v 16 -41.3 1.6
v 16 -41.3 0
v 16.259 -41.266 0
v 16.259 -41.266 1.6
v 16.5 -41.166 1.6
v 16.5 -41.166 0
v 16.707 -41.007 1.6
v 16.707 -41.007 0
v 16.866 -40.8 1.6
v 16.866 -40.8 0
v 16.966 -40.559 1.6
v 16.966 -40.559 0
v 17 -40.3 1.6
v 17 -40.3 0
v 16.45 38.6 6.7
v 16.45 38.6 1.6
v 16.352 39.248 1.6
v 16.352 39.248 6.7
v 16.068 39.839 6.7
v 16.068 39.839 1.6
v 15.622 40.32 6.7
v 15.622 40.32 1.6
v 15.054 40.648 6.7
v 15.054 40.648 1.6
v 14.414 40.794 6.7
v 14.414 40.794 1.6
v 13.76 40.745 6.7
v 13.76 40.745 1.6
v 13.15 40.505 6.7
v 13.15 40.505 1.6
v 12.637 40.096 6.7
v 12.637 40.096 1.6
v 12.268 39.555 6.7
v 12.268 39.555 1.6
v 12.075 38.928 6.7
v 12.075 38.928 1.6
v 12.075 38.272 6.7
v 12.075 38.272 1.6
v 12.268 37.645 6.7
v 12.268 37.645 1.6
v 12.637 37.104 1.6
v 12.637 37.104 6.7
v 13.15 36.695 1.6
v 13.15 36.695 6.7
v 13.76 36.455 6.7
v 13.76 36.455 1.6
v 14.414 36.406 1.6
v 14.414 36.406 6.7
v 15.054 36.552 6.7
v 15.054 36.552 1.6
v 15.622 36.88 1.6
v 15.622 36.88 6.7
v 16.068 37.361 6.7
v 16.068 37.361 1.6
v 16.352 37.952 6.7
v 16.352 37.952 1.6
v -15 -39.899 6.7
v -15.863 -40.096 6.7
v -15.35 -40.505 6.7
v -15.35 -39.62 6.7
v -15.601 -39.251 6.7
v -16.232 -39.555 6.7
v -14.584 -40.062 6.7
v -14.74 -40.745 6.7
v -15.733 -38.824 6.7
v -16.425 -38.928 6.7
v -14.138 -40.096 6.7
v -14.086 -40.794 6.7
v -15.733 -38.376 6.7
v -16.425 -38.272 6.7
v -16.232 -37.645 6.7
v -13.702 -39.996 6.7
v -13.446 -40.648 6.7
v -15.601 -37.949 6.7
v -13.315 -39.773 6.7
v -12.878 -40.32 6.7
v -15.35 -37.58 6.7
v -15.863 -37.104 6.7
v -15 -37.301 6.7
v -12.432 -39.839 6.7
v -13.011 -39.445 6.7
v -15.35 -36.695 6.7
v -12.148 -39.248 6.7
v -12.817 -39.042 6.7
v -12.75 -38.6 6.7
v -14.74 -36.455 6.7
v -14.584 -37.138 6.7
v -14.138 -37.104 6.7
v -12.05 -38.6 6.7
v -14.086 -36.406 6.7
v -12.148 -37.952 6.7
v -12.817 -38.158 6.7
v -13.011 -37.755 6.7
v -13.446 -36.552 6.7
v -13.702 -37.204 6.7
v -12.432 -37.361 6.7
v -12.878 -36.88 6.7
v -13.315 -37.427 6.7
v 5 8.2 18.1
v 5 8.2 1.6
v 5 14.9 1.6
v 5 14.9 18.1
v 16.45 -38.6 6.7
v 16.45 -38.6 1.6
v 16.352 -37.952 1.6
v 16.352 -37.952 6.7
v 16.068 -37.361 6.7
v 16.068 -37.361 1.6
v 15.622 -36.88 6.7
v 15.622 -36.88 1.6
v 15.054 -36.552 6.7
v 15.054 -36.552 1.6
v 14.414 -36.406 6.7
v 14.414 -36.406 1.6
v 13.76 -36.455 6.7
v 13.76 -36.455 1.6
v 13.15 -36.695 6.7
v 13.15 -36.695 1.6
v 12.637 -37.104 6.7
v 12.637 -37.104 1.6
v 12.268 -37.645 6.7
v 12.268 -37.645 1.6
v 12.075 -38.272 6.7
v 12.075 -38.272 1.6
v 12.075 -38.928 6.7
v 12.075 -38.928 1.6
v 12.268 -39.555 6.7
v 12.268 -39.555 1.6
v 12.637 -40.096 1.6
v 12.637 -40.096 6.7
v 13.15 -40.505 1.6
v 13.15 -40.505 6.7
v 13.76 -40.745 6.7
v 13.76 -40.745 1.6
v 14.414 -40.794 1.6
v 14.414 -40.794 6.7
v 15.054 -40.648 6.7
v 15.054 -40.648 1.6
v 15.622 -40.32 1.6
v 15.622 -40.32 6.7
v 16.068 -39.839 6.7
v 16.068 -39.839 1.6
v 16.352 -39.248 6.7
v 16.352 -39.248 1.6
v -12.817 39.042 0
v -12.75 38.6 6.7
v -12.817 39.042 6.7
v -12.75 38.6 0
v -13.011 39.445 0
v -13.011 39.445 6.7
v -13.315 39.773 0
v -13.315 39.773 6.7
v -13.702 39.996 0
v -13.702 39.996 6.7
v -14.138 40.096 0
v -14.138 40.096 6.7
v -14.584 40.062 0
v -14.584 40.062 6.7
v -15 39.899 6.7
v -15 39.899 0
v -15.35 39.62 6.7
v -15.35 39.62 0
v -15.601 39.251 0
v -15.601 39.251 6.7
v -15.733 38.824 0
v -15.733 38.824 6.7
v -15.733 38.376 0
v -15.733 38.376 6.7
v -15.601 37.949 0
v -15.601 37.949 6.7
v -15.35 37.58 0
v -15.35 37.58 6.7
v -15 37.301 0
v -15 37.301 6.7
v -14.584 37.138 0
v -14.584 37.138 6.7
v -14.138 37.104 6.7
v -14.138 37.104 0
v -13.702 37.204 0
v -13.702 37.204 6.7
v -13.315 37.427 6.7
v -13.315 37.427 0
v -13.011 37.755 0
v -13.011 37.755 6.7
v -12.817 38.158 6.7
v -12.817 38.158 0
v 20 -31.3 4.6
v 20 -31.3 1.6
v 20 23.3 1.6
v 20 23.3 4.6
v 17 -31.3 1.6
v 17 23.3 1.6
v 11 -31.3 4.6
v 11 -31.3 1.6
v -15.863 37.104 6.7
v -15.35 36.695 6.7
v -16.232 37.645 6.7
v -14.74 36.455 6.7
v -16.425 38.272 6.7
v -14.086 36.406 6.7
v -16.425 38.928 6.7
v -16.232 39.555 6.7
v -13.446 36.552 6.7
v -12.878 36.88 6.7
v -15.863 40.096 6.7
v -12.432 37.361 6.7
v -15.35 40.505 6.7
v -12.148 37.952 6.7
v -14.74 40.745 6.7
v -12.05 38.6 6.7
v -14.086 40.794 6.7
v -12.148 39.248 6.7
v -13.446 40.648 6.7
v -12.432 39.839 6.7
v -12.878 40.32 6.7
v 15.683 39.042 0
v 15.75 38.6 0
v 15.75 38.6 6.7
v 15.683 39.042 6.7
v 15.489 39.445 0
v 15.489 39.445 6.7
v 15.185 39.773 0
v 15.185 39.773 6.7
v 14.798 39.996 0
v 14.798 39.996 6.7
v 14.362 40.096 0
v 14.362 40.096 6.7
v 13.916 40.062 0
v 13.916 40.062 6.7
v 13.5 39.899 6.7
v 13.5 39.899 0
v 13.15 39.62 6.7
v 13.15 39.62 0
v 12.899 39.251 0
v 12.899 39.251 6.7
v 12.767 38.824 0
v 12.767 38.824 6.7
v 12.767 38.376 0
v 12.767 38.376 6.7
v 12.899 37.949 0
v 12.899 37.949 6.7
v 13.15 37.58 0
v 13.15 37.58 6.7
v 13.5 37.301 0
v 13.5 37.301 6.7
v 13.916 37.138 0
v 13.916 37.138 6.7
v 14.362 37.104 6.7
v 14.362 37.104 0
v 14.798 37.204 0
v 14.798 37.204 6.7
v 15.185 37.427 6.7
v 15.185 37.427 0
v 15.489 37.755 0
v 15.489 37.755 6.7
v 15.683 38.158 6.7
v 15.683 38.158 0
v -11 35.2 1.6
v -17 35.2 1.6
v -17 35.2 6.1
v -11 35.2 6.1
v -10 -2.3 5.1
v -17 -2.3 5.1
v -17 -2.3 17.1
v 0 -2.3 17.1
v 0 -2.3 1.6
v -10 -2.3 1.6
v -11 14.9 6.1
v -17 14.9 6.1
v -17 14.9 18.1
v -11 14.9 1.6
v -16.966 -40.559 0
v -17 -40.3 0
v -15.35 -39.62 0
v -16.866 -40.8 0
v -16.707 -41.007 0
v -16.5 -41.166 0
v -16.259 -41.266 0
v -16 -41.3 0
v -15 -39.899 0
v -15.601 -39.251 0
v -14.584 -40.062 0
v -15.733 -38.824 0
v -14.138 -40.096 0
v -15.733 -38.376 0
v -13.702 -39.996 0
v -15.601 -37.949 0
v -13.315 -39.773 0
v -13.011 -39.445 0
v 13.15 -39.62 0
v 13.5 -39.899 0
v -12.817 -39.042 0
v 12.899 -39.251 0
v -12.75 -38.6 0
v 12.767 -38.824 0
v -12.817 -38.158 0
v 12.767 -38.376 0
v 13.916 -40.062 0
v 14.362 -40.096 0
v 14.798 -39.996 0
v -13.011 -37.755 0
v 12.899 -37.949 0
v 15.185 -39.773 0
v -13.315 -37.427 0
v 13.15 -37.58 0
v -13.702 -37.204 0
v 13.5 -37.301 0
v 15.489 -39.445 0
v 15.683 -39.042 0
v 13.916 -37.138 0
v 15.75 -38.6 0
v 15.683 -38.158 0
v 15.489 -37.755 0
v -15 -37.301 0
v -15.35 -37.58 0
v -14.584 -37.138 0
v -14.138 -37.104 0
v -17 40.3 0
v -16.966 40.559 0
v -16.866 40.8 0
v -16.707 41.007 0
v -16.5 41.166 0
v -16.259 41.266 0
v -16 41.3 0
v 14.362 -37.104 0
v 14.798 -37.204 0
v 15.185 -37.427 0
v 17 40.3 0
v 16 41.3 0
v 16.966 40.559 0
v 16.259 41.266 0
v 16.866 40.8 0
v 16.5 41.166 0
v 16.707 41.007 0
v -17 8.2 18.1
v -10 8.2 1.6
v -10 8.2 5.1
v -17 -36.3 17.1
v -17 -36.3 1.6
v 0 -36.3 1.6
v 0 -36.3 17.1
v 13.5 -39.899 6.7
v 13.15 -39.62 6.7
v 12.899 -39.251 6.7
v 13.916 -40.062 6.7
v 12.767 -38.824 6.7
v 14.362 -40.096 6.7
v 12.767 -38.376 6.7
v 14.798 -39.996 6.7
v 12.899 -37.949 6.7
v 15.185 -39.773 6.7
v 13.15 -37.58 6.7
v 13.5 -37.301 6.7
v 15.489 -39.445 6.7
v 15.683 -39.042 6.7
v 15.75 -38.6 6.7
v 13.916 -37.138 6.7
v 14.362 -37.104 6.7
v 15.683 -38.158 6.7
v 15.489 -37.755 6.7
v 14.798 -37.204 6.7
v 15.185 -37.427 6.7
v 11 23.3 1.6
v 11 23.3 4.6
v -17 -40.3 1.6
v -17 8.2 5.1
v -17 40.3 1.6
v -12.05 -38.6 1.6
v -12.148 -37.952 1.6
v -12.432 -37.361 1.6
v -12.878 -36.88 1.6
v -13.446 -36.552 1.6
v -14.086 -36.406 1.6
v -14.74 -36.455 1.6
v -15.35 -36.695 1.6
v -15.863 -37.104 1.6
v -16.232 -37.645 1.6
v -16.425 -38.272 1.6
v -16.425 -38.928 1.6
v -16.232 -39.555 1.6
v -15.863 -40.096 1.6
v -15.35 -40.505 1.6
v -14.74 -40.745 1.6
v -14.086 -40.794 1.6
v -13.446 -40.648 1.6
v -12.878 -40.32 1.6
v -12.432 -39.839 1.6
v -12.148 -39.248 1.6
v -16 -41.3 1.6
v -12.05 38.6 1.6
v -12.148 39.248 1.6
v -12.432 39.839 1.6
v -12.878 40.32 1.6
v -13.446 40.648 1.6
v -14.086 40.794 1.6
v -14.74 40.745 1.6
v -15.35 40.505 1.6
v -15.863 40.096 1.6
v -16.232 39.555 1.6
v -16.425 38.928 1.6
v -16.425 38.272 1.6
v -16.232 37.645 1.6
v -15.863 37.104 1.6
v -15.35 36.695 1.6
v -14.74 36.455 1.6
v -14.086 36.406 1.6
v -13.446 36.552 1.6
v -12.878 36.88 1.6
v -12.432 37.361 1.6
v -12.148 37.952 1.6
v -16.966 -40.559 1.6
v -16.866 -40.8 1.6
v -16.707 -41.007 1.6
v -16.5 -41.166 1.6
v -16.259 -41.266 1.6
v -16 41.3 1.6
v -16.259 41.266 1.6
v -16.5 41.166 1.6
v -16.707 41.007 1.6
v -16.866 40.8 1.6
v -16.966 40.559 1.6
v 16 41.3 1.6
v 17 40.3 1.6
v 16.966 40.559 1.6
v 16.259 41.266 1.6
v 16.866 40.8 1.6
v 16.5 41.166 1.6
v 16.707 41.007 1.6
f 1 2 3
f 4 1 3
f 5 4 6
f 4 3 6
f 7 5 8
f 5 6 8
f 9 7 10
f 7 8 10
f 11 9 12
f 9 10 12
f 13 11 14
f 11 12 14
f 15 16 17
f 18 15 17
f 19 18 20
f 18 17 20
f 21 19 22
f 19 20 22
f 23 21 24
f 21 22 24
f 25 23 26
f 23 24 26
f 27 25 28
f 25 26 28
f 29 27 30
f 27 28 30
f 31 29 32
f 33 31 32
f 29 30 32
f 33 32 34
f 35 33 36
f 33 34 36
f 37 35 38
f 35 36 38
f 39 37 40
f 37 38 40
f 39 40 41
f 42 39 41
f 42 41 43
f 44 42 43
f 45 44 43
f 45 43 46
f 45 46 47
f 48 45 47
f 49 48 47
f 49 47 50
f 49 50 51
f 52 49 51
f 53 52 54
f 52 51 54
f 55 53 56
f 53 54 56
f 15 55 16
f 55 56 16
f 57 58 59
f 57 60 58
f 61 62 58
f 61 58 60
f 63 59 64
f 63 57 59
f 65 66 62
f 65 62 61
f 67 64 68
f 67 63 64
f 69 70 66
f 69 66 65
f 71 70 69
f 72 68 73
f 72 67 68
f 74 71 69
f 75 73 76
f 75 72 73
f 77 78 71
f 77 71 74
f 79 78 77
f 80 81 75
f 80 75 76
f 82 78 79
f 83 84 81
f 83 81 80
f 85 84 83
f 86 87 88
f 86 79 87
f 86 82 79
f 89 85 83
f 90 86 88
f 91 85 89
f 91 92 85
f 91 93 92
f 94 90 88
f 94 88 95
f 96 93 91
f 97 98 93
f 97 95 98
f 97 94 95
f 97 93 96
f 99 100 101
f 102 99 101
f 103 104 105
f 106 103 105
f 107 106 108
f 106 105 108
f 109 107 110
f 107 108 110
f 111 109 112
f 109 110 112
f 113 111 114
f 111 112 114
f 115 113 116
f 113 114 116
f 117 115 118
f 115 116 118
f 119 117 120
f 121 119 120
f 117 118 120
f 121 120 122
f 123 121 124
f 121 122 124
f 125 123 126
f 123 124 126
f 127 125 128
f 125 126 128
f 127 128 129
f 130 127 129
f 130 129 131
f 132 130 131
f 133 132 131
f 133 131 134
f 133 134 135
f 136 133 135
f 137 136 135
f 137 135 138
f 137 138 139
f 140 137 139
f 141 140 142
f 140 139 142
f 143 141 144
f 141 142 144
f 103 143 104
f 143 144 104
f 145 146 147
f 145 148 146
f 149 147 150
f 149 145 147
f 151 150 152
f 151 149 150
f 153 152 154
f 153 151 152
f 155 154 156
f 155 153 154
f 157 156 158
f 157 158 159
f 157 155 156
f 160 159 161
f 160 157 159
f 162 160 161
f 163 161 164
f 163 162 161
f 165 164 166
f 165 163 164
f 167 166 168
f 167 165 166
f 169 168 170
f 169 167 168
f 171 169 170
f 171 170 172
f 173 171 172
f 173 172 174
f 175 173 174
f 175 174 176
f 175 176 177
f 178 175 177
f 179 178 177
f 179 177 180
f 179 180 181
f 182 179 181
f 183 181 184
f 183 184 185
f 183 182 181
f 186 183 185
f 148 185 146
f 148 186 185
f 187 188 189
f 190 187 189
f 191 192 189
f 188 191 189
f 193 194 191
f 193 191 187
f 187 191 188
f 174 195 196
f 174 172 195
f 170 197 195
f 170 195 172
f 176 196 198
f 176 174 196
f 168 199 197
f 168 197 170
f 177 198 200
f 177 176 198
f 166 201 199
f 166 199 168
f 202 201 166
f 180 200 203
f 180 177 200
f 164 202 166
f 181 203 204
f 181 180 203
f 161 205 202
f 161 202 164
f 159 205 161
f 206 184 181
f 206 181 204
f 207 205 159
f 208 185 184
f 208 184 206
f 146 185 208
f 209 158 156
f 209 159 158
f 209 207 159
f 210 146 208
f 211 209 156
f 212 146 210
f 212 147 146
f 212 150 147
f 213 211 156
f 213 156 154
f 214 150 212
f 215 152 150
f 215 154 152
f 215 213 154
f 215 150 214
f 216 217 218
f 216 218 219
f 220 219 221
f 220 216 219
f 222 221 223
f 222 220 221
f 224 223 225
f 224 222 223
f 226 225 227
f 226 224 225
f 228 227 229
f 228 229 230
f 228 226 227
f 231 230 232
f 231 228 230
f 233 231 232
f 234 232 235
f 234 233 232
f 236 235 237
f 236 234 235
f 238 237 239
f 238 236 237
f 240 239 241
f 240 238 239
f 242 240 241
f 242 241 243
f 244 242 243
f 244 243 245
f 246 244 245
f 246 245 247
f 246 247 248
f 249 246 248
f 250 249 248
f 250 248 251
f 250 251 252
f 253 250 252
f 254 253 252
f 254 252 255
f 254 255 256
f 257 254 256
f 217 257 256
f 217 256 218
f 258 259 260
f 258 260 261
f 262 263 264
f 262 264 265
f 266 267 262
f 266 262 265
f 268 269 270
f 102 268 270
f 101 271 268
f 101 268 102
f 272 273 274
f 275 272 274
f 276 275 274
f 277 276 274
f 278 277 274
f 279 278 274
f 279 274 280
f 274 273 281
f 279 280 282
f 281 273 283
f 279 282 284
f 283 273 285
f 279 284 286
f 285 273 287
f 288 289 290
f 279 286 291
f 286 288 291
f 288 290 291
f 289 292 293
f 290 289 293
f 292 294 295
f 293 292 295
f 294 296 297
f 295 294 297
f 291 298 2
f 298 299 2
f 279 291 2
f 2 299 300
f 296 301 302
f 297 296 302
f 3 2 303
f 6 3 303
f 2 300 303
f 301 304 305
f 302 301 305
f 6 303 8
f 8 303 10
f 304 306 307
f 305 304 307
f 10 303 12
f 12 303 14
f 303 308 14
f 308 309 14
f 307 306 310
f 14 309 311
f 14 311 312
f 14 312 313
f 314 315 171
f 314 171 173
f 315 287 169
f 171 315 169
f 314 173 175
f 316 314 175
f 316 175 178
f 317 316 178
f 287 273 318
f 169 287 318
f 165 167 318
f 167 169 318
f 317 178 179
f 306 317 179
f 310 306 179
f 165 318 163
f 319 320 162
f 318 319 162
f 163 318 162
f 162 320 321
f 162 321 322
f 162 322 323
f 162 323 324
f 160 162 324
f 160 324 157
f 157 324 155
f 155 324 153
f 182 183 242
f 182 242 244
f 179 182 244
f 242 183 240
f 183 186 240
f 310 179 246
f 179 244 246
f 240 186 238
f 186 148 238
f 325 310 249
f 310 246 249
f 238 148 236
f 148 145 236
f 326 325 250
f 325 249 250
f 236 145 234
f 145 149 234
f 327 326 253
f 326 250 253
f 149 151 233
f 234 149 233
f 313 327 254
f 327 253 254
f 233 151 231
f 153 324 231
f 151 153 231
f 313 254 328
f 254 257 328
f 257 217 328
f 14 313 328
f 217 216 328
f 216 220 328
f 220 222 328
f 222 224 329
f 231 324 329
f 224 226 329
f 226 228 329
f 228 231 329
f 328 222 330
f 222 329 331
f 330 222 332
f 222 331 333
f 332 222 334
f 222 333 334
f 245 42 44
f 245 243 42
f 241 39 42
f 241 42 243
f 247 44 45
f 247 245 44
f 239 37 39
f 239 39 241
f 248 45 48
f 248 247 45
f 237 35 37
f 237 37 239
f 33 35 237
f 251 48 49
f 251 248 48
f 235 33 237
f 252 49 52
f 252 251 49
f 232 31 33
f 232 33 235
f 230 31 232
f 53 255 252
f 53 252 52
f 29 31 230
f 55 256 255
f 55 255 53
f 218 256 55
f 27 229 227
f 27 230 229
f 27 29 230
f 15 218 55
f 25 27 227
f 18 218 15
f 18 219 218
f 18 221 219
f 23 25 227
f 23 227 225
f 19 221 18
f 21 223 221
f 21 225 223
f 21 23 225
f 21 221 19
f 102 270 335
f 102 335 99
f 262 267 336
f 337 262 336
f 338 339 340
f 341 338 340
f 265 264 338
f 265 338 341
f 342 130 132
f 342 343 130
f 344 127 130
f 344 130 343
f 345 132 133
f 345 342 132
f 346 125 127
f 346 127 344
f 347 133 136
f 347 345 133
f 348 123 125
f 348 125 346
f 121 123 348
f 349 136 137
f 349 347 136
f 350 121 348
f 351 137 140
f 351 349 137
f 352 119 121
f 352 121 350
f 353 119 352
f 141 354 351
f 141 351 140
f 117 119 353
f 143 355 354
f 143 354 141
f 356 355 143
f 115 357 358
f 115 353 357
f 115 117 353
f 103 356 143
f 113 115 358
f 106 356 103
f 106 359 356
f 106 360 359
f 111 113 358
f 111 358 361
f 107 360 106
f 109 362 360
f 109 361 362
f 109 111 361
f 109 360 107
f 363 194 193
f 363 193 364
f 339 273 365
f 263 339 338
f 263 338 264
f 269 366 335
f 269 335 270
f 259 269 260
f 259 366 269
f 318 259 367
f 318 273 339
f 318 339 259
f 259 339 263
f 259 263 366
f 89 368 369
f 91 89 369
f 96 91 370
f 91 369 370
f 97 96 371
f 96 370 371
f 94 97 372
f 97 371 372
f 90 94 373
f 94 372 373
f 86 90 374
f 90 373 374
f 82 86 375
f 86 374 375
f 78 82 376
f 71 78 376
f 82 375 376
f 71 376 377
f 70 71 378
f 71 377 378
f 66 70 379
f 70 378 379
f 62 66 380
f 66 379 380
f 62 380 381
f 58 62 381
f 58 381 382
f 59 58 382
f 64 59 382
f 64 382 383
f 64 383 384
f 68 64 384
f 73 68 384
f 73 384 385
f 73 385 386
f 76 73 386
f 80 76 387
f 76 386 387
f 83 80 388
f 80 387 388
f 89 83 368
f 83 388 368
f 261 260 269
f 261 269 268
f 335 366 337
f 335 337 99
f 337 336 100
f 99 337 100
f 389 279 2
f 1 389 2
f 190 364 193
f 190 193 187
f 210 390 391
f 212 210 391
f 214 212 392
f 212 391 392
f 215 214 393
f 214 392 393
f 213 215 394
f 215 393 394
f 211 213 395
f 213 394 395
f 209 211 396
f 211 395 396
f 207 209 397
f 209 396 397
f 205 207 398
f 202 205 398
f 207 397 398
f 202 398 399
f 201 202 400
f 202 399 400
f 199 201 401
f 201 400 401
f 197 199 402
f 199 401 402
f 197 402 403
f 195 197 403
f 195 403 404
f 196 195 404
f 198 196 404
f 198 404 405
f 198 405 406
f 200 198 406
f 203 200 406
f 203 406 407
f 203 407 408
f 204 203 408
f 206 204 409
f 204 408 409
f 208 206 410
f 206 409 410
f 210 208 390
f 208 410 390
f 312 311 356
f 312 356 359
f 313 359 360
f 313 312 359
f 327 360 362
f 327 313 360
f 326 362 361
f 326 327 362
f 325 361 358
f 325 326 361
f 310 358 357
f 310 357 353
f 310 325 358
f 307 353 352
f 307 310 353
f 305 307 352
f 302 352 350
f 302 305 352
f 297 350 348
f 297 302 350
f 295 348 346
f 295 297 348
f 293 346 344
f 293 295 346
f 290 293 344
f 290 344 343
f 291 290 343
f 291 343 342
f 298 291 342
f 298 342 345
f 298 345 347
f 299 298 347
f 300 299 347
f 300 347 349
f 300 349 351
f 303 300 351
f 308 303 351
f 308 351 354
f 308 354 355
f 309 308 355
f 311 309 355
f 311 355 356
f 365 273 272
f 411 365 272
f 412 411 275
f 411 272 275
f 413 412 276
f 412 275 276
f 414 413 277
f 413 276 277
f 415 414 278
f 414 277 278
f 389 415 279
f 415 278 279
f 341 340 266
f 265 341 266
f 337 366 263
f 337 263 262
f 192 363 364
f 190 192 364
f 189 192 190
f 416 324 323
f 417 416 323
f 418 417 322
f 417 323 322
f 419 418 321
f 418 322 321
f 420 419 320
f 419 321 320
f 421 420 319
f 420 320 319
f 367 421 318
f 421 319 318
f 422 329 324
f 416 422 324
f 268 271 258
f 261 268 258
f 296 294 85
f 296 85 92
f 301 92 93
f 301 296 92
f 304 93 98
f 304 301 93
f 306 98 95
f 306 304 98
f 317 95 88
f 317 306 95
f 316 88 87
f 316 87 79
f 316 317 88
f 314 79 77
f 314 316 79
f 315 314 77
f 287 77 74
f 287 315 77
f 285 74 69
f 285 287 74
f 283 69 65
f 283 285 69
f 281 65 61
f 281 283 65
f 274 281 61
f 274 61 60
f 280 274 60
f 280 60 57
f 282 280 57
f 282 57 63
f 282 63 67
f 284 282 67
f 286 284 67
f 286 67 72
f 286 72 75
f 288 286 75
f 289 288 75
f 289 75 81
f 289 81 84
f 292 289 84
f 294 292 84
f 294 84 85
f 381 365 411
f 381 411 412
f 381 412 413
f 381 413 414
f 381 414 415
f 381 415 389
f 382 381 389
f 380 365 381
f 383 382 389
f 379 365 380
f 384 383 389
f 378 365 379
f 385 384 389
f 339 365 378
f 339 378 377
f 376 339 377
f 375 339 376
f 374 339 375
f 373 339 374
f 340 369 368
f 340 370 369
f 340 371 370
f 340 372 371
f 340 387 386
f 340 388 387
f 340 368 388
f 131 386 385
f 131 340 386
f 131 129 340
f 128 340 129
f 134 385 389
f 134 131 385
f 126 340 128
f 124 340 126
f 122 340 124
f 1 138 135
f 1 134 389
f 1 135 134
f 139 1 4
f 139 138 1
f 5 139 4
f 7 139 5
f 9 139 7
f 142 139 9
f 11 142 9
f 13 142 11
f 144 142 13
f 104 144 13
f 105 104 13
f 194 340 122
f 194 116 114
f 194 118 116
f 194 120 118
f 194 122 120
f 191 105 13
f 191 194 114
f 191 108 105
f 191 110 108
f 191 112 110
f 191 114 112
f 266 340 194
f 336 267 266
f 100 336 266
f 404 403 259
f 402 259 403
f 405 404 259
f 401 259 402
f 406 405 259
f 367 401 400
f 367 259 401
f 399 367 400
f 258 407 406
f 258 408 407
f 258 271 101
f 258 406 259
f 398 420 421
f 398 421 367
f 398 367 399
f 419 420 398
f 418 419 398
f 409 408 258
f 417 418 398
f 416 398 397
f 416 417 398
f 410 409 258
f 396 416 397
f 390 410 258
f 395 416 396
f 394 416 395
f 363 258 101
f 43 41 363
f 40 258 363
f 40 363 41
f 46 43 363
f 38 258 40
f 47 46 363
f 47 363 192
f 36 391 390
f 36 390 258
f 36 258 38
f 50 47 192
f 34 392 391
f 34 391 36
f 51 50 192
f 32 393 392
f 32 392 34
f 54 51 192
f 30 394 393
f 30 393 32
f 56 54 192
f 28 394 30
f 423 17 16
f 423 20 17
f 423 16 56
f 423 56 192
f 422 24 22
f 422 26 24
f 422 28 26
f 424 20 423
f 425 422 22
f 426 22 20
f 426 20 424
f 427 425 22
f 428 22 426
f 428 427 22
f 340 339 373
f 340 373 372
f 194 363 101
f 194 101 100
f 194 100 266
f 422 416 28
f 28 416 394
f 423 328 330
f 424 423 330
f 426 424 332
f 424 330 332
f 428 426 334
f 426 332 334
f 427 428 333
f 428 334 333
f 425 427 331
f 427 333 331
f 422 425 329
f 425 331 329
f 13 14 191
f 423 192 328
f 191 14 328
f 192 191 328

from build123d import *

# Parameters (mm, degrees)
SKETCH_2_R      = 1.5
EXTRUDE_1_DEPTH = 1.6
SKETCH_3_W      = 9
SKETCH_3_H      = 54.6
EXTRUDE_2_DEPTH = 3
SKETCH_4_W      = 17
SKETCH_4_H      = 34
EXTRUDE_3_DEPTH = 15.5
SKETCH_5_W      = 7
SKETCH_5_H      = 10.5
EXTRUDE_4_DEPTH = 3.5
SKETCH_6_R      = 2.2
SKETCH_6_R_2    = 1.5
EXTRUDE_5_DEPTH = 5.1
SKETCH_7_W      = 22
SKETCH_7_H      = 6.7
EXTRUDE_6_DEPTH = 16.5
SKETCH_8_W      = 6
SKETCH_8_H      = 20.3
EXTRUDE_7_DEPTH = 4.5


with BuildPart() as part:
    # 草图2 → 凸台-拉伸1 (new body)
    with BuildSketch(Plane.XY):
        with BuildLine():
            Line((-16, -41.3), (16, -41.3))
            ThreePointArc((16, -41.3), (16.707106781, -41.007106781), (17, -40.3))
            Line((17, -40.3), (17, 40.3))
            ThreePointArc((17, 40.3), (16.707106781, 41.007106781), (16, 41.3))
            Line((16, 41.3), (-16, 41.3))
            ThreePointArc((-16, 41.3), (-16.707106781, 41.007106781), (-17, 40.3))
            Line((-17, 40.3), (-17, -40.3))
            ThreePointArc((-17, -40.3), (-16.707106781, -41.007106781), (-16, -41.3))
        make_face()
        with Locations((-14.25, 38.6)):
            Circle(SKETCH_2_R, mode=Mode.SUBTRACT)
        with Locations((14.25, 38.6)):
            Circle(SKETCH_2_R, mode=Mode.SUBTRACT)
        with Locations((-14.25, -38.6)):
            Circle(SKETCH_2_R, mode=Mode.SUBTRACT)
        with Locations((14.25, -38.6)):
            Circle(SKETCH_2_R, mode=Mode.SUBTRACT)
    extrude(amount=EXTRUDE_1_DEPTH)

    # 草图3 → 凸台-拉伸2 (add)
    with BuildSketch(Plane.XY.offset(1.6)):
        with Locations((15.5, -4)):
            Rectangle(SKETCH_3_W, SKETCH_3_H)
    extrude(amount=EXTRUDE_2_DEPTH)

    # 草图4 → 凸台-拉伸3 (add)
    with BuildSketch(Plane.XY.offset(1.6)):
        with Locations((-8.5, -19.3)):
            Rectangle(SKETCH_4_W, SKETCH_4_H)
    extrude(amount=EXTRUDE_3_DEPTH)

    # 草图5 → 凸台-拉伸4 (add)
    with BuildSketch(Plane.XY.offset(1.6)):
        with Locations((-13.5, 2.95)):
            Rectangle(SKETCH_5_W, SKETCH_5_H)
    extrude(amount=EXTRUDE_4_DEPTH)

    # 草图6 → 凸台-拉伸5 (add)
    # profile 1 of 4: a face of its own
    with BuildSketch(Plane.XY.offset(1.6)):
        with Locations((-14.25, 38.6)):
            Circle(SKETCH_6_R)
        with Locations((-14.25, 38.6)):
            Circle(SKETCH_6_R_2, mode=Mode.SUBTRACT)
    # profile 2 of 4: a face of its own
    with BuildSketch(Plane.XY.offset(1.6)):
        with Locations((14.25, 38.6)):
            Circle(SKETCH_6_R)
        with Locations((14.25, 38.6)):
            Circle(SKETCH_6_R_2, mode=Mode.SUBTRACT)
    # profile 3 of 4: a face of its own
    with BuildSketch(Plane.XY.offset(1.6)):
        with Locations((-14.25, -38.6)):
            Circle(SKETCH_6_R)
        with Locations((-14.25, -38.6)):
            Circle(SKETCH_6_R_2, mode=Mode.SUBTRACT)
    # profile 4 of 4: a face of its own
    with BuildSketch(Plane.XY.offset(1.6)):
        with Locations((14.25, -38.6)):
            Circle(SKETCH_6_R)
        with Locations((14.25, -38.6)):
            Circle(SKETCH_6_R_2, mode=Mode.SUBTRACT)
    extrude(amount=EXTRUDE_5_DEPTH)

    # 草图7 → 凸台-拉伸6 (add)
    with BuildSketch(Plane.XY.offset(1.6)):
        with Locations((-6, 11.55)):
            Rectangle(SKETCH_7_W, SKETCH_7_H)
    extrude(amount=EXTRUDE_6_DEPTH)

    # 草图8 → 凸台-拉伸7 (add)
    with BuildSketch(Plane.XY.offset(1.6)):
        with Locations((-14, 25.05)):
            Rectangle(SKETCH_8_W, SKETCH_8_H)
    extrude(amount=EXTRUDE_7_DEPTH)


solid = part.part
